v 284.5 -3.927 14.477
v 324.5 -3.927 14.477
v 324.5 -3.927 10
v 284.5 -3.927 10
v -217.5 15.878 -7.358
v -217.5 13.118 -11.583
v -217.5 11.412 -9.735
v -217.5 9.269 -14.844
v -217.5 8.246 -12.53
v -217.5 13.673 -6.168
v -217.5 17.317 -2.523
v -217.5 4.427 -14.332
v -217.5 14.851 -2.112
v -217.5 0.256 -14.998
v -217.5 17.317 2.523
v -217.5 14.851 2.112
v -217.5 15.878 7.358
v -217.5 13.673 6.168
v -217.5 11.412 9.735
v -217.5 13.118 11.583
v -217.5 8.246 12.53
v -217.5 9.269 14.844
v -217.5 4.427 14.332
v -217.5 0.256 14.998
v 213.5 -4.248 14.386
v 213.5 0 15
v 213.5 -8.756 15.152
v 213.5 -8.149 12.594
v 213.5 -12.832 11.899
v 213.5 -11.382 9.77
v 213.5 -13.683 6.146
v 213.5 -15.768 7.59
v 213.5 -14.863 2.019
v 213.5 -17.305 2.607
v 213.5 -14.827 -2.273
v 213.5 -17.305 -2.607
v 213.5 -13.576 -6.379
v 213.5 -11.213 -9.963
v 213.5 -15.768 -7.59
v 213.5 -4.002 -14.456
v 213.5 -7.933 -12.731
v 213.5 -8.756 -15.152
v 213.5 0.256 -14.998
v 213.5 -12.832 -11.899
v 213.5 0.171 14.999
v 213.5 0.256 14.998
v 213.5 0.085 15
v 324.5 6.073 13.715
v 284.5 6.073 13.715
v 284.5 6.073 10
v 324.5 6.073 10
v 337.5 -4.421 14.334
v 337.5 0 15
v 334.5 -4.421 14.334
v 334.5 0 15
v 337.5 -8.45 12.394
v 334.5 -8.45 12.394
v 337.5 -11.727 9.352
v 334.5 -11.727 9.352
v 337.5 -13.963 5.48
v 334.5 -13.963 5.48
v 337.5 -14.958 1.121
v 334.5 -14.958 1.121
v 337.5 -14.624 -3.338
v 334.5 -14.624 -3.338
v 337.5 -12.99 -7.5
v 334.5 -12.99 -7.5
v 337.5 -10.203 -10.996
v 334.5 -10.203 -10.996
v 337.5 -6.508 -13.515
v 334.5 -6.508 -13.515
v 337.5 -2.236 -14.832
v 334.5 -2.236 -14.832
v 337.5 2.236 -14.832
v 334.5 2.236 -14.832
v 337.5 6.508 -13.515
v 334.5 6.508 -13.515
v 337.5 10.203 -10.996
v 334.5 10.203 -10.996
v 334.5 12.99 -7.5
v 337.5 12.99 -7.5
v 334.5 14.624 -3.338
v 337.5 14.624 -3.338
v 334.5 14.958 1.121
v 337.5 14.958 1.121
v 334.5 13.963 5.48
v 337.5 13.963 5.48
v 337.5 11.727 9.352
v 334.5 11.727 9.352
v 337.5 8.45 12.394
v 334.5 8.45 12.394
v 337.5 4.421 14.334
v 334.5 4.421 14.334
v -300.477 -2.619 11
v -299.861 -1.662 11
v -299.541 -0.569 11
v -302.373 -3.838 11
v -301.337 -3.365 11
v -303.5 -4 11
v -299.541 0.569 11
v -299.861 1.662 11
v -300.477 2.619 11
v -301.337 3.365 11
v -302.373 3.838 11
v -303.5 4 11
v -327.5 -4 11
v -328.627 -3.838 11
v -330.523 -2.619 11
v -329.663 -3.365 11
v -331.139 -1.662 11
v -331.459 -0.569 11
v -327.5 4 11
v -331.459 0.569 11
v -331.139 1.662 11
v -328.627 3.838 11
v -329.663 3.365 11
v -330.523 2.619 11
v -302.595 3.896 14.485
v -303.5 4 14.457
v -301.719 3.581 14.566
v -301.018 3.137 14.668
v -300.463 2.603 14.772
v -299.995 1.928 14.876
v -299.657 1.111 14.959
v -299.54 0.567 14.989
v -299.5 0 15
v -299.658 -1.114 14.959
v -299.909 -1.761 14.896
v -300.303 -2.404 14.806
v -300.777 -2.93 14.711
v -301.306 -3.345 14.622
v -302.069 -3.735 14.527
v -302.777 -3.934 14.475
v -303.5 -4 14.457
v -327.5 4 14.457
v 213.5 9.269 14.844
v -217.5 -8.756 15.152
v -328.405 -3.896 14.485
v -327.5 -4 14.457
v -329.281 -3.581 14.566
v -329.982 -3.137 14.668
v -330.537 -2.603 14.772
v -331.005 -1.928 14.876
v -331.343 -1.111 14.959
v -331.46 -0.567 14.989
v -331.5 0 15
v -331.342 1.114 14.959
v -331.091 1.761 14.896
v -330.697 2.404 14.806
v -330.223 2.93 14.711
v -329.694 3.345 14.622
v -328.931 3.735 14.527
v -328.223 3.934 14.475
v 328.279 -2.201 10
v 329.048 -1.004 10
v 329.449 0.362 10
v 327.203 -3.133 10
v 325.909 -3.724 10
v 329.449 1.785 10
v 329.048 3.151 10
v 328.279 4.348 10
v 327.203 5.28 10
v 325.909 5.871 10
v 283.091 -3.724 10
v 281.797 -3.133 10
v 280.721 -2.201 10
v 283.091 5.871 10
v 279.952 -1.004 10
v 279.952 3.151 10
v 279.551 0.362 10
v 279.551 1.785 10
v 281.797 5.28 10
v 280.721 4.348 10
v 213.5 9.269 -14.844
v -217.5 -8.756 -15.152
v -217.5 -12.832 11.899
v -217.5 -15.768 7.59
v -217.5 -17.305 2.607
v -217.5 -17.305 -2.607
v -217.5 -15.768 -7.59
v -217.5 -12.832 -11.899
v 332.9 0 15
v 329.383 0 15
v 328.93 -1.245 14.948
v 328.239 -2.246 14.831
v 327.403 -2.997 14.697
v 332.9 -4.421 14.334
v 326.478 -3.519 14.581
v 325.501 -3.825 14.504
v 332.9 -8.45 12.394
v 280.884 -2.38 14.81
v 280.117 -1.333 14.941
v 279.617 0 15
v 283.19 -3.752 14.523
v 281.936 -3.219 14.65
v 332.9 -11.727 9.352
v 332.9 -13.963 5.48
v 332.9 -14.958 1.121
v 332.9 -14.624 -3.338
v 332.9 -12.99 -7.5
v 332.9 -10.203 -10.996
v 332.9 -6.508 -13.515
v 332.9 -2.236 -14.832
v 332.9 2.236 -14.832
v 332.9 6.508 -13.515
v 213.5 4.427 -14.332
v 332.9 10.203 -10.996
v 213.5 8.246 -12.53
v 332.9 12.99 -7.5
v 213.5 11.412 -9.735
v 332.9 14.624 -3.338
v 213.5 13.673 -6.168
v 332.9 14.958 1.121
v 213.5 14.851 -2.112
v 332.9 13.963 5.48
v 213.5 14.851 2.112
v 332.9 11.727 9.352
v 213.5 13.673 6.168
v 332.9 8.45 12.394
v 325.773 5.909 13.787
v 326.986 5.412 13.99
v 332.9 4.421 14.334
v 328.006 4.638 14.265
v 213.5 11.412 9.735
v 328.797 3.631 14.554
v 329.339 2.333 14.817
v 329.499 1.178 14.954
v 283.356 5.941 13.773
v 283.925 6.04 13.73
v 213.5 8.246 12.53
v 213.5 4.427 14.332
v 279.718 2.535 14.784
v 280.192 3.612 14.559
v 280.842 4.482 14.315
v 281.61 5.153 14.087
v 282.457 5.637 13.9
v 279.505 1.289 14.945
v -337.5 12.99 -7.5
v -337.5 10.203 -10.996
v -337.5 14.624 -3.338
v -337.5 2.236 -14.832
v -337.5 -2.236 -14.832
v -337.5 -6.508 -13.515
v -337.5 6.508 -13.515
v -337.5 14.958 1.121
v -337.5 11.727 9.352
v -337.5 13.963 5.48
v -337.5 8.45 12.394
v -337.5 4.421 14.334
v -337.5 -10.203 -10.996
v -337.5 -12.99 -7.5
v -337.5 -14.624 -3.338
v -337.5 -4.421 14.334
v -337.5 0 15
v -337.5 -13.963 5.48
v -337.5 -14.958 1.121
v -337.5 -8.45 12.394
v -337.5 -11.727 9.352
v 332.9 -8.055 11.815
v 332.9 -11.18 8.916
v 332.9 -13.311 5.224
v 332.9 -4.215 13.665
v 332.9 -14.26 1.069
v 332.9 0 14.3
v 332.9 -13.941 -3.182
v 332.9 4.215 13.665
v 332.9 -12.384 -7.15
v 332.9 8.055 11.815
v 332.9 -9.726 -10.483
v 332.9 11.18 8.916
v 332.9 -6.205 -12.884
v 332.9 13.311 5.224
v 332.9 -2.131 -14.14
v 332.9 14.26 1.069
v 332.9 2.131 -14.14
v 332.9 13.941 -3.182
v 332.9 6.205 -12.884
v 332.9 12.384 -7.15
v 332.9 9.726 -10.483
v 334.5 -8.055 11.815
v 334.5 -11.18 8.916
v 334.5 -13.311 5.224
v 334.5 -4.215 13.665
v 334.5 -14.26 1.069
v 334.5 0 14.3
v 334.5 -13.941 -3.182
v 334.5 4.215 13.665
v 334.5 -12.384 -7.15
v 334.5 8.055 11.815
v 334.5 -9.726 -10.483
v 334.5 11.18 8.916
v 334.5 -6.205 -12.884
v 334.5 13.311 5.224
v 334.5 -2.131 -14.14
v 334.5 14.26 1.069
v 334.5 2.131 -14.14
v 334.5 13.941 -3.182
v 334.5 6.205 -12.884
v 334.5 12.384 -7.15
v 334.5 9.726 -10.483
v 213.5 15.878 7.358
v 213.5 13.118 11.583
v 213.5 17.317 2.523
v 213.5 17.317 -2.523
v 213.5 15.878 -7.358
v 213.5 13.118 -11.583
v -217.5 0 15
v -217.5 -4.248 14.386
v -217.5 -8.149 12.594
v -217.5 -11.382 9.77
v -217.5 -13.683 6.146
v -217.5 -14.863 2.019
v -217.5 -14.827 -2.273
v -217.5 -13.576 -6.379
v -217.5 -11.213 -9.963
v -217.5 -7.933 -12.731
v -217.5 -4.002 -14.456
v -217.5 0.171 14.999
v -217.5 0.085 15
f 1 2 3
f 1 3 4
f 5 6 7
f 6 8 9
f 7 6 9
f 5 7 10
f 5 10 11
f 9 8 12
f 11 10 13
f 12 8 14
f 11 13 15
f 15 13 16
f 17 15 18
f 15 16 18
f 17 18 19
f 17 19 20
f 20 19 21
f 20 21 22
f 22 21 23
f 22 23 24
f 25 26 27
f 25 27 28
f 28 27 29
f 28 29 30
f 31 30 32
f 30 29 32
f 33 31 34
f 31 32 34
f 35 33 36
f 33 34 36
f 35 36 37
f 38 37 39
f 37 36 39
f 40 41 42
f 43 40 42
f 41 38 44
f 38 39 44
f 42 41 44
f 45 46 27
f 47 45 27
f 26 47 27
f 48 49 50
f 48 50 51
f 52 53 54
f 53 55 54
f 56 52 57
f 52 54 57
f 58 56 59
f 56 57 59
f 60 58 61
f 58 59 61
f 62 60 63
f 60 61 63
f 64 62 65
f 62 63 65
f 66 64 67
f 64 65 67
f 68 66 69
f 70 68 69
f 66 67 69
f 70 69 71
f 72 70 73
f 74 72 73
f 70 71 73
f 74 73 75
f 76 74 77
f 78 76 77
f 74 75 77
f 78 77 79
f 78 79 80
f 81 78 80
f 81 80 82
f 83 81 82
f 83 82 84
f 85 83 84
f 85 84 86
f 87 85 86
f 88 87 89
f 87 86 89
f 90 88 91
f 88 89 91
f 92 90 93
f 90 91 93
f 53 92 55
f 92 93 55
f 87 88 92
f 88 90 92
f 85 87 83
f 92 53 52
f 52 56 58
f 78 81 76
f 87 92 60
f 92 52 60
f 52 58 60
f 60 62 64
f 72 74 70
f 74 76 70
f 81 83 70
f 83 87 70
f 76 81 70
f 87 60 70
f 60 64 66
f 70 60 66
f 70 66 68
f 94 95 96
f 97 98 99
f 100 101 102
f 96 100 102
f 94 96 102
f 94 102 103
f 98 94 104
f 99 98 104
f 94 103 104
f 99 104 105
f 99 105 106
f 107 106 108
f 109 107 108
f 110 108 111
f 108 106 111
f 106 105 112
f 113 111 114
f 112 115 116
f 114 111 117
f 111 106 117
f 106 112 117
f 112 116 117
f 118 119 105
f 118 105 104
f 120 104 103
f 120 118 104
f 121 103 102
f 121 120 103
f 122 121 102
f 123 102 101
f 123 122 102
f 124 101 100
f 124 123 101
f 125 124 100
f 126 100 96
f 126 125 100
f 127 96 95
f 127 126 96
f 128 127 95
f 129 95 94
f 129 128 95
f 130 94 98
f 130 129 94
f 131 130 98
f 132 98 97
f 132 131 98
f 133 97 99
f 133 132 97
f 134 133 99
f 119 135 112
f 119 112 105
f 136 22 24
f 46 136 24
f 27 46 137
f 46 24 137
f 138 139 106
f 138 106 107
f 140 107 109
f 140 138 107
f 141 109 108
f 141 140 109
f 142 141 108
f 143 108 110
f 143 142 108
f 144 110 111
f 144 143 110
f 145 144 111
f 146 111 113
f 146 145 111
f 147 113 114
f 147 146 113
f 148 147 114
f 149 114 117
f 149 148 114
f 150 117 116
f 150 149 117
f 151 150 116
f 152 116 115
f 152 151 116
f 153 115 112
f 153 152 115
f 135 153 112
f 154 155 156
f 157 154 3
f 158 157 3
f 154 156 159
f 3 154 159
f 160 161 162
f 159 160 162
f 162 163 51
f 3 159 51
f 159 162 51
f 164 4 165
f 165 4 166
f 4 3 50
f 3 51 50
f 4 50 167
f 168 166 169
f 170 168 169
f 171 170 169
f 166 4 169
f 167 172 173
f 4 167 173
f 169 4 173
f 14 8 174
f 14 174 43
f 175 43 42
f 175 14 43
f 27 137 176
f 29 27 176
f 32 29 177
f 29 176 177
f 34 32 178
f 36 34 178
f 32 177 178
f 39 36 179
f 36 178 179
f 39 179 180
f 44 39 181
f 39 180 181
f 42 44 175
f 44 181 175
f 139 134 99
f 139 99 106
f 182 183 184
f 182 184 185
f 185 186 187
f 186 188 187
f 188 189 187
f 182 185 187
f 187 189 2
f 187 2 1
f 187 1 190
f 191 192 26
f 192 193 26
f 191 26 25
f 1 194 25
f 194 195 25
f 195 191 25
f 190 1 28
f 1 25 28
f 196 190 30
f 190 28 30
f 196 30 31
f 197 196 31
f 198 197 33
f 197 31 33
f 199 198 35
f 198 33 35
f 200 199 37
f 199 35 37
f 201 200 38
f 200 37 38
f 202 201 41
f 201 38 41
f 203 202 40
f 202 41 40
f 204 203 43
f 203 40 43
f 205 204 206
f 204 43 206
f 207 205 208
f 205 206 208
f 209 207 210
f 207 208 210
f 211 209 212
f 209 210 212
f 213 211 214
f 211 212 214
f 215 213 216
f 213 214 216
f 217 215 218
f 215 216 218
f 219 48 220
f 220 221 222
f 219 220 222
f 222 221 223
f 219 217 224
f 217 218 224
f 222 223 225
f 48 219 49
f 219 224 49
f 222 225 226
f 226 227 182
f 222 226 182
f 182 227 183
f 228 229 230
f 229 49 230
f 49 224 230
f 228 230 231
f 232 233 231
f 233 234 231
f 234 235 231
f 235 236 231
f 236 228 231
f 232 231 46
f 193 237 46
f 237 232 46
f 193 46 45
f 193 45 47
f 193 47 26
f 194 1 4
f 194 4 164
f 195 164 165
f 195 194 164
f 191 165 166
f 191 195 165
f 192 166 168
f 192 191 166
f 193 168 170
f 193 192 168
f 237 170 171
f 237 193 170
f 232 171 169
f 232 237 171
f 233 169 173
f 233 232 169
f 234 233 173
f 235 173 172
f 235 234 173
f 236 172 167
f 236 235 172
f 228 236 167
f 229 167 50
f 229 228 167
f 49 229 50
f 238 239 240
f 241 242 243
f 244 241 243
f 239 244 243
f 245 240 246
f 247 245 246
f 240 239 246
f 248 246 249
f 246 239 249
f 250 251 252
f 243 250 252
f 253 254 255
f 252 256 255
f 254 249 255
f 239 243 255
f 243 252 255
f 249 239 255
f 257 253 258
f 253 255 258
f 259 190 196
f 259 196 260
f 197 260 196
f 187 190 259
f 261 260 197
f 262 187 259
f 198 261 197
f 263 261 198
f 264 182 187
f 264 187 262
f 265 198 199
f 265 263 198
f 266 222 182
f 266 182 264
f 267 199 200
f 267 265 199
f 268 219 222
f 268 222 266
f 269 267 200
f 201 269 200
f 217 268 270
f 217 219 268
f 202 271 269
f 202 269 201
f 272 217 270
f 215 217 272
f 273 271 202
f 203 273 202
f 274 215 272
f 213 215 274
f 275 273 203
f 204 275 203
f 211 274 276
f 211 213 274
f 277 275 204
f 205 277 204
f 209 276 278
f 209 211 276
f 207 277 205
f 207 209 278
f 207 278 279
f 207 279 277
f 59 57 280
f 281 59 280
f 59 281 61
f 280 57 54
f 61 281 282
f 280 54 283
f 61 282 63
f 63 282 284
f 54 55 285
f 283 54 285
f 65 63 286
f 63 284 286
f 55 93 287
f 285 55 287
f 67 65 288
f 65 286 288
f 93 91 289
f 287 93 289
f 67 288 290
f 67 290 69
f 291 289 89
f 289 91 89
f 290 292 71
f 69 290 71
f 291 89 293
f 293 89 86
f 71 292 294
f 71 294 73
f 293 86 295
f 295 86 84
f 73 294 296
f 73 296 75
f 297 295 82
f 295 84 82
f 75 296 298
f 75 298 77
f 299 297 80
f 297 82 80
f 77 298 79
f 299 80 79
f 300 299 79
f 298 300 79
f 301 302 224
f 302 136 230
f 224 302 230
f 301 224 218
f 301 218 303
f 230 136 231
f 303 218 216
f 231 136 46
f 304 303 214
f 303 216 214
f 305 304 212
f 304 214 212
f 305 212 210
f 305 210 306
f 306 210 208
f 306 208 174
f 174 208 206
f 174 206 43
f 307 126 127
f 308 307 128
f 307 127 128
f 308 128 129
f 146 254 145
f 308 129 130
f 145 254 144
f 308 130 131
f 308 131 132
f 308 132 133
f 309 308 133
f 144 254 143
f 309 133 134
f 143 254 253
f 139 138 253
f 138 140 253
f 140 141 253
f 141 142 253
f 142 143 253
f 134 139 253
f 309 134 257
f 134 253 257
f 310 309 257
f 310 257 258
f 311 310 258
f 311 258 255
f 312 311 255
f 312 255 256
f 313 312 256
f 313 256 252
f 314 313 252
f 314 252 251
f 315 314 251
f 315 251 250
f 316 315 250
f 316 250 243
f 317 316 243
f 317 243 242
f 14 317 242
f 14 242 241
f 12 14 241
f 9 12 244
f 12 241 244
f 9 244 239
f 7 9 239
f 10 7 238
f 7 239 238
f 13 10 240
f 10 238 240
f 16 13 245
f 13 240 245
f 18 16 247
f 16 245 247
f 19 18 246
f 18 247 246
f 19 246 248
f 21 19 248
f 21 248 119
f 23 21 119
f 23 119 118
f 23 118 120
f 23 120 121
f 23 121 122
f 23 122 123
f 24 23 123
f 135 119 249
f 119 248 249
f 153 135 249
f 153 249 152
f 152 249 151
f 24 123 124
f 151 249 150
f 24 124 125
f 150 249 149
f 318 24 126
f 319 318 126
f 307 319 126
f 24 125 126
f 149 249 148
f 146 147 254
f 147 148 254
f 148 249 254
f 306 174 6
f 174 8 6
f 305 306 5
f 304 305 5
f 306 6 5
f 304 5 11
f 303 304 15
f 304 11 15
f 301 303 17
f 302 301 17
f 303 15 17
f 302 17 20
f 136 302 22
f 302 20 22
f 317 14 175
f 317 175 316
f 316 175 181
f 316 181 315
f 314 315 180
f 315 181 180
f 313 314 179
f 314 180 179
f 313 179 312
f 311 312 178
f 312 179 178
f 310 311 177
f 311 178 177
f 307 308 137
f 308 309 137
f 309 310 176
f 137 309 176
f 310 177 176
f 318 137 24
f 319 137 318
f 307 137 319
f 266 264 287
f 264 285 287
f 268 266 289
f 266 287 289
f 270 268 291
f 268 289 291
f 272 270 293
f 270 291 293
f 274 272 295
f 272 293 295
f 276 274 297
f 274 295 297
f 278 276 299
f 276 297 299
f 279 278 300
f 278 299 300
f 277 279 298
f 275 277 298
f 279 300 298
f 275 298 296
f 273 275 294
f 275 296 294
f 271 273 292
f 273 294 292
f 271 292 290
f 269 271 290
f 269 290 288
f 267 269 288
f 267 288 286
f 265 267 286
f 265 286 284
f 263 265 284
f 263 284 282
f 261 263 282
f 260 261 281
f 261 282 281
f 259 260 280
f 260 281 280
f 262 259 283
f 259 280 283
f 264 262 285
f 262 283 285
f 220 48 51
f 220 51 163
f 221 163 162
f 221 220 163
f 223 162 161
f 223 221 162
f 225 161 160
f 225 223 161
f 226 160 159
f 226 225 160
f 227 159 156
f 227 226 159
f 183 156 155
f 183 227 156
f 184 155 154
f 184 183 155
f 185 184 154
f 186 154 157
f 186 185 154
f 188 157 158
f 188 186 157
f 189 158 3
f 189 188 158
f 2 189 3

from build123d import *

# Parameters (mm, degrees)
KES_EKSTR_ZYON1_DEPTH = 431
KES_EKSTR_ZYON2_DEPTH = 4
IZIM4_W               = 1.6
IZIM4_H               = 0.7
KES_EKSTR_ZYON3_DEPTH = 5


with BuildPart() as part:
    # Çizim1 → Döndür1 (revolve)
    with BuildSketch(Plane.XY, mode=Mode.PRIVATE) as d_nd_r1_sk:
        Polygon((-337.5, 0), (337.5, 0), (337.5, 15), (213.5, 15), (213.5, 17.5), (-217.5, 17.5), (-217.5, 15), (-337.5, 15), align=None)
    revolve(d_nd_r1_sk.sketch.rotate(Axis((-337.5, 0, 0), (1, 0, 0)), 90), axis=Axis((-337.5, 0, 0), (1, 0, 0)))

    # Çizim2 → Kes-Ekstrüzyon1 (cut)
    with BuildSketch(Plane.ZY.offset(217.5)):
        with BuildLine():
            Line((-14.843898339, 9.268693657), (-15.15172785, -8.756434386))
            ThreePointArc((-15.15172785, -8.756434386), (-17.49744861, 0.298817908), (-14.843898339, 9.268693657))
        make_face()
        with BuildLine():
            Line((14.843898339, 9.268693657), (15.15172785, -8.756434386))
            ThreePointArc((15.15172785, -8.756434386), (17.49744861, 0.298817908), (14.843898339, 9.268693657))
        make_face()
    extrude(amount=-KES_EKSTR_ZYON1_DEPTH, mode=Mode.SUBTRACT)

    # Çizim3 → Kes-Ekstrüzyon2 (cut)
    with BuildSketch(Plane.XY.offset(15)):
        with BuildLine():
            Line((-327.5, 4), (-303.5, 4))
            ThreePointArc((-303.5, 4), (-299.5, 0), (-303.5, -4))
            Line((-303.5, -4), (-327.5, -4))
            ThreePointArc((-327.5, -4), (-331.5, 0), (-327.5, 4))
        make_face()
    extrude(amount=-KES_EKSTR_ZYON2_DEPTH, mode=Mode.SUBTRACT)

    # Çizim4 → Kes-Döndür1 (revolve, cut)
    with BuildSketch(Plane.XY, mode=Mode.PRIVATE) as kes_d_nd_r1_sk:
        with Locations((333.7, 14.65)):
            Rectangle(IZIM4_W, IZIM4_H)
    revolve(kes_d_nd_r1_sk.sketch.rotate(Axis((337.5, 0, 0), (-1, 0, 0)), 270), axis=Axis((337.5, 0, 0), (-1, 0, 0)), mode=Mode.SUBTRACT)

    # Çizim5 → Kes-Ekstrüzyon3 (cut)
    with BuildSketch(Plane.XY.offset(15)):
        with BuildLine():
            Line((284.5, 6.07346209), (324.5, 6.07346209))
            ThreePointArc((324.5, 6.07346209), (329.5, 1.07346209), (324.5, -3.92653791))
            Line((324.5, -3.92653791), (284.5, -3.92653791))
            ThreePointArc((284.5, -3.92653791), (279.5, 1.07346209), (284.5, 6.07346209))
        make_face()
    extrude(amount=-KES_EKSTR_ZYON3_DEPTH, mode=Mode.SUBTRACT)


solid = part.part
